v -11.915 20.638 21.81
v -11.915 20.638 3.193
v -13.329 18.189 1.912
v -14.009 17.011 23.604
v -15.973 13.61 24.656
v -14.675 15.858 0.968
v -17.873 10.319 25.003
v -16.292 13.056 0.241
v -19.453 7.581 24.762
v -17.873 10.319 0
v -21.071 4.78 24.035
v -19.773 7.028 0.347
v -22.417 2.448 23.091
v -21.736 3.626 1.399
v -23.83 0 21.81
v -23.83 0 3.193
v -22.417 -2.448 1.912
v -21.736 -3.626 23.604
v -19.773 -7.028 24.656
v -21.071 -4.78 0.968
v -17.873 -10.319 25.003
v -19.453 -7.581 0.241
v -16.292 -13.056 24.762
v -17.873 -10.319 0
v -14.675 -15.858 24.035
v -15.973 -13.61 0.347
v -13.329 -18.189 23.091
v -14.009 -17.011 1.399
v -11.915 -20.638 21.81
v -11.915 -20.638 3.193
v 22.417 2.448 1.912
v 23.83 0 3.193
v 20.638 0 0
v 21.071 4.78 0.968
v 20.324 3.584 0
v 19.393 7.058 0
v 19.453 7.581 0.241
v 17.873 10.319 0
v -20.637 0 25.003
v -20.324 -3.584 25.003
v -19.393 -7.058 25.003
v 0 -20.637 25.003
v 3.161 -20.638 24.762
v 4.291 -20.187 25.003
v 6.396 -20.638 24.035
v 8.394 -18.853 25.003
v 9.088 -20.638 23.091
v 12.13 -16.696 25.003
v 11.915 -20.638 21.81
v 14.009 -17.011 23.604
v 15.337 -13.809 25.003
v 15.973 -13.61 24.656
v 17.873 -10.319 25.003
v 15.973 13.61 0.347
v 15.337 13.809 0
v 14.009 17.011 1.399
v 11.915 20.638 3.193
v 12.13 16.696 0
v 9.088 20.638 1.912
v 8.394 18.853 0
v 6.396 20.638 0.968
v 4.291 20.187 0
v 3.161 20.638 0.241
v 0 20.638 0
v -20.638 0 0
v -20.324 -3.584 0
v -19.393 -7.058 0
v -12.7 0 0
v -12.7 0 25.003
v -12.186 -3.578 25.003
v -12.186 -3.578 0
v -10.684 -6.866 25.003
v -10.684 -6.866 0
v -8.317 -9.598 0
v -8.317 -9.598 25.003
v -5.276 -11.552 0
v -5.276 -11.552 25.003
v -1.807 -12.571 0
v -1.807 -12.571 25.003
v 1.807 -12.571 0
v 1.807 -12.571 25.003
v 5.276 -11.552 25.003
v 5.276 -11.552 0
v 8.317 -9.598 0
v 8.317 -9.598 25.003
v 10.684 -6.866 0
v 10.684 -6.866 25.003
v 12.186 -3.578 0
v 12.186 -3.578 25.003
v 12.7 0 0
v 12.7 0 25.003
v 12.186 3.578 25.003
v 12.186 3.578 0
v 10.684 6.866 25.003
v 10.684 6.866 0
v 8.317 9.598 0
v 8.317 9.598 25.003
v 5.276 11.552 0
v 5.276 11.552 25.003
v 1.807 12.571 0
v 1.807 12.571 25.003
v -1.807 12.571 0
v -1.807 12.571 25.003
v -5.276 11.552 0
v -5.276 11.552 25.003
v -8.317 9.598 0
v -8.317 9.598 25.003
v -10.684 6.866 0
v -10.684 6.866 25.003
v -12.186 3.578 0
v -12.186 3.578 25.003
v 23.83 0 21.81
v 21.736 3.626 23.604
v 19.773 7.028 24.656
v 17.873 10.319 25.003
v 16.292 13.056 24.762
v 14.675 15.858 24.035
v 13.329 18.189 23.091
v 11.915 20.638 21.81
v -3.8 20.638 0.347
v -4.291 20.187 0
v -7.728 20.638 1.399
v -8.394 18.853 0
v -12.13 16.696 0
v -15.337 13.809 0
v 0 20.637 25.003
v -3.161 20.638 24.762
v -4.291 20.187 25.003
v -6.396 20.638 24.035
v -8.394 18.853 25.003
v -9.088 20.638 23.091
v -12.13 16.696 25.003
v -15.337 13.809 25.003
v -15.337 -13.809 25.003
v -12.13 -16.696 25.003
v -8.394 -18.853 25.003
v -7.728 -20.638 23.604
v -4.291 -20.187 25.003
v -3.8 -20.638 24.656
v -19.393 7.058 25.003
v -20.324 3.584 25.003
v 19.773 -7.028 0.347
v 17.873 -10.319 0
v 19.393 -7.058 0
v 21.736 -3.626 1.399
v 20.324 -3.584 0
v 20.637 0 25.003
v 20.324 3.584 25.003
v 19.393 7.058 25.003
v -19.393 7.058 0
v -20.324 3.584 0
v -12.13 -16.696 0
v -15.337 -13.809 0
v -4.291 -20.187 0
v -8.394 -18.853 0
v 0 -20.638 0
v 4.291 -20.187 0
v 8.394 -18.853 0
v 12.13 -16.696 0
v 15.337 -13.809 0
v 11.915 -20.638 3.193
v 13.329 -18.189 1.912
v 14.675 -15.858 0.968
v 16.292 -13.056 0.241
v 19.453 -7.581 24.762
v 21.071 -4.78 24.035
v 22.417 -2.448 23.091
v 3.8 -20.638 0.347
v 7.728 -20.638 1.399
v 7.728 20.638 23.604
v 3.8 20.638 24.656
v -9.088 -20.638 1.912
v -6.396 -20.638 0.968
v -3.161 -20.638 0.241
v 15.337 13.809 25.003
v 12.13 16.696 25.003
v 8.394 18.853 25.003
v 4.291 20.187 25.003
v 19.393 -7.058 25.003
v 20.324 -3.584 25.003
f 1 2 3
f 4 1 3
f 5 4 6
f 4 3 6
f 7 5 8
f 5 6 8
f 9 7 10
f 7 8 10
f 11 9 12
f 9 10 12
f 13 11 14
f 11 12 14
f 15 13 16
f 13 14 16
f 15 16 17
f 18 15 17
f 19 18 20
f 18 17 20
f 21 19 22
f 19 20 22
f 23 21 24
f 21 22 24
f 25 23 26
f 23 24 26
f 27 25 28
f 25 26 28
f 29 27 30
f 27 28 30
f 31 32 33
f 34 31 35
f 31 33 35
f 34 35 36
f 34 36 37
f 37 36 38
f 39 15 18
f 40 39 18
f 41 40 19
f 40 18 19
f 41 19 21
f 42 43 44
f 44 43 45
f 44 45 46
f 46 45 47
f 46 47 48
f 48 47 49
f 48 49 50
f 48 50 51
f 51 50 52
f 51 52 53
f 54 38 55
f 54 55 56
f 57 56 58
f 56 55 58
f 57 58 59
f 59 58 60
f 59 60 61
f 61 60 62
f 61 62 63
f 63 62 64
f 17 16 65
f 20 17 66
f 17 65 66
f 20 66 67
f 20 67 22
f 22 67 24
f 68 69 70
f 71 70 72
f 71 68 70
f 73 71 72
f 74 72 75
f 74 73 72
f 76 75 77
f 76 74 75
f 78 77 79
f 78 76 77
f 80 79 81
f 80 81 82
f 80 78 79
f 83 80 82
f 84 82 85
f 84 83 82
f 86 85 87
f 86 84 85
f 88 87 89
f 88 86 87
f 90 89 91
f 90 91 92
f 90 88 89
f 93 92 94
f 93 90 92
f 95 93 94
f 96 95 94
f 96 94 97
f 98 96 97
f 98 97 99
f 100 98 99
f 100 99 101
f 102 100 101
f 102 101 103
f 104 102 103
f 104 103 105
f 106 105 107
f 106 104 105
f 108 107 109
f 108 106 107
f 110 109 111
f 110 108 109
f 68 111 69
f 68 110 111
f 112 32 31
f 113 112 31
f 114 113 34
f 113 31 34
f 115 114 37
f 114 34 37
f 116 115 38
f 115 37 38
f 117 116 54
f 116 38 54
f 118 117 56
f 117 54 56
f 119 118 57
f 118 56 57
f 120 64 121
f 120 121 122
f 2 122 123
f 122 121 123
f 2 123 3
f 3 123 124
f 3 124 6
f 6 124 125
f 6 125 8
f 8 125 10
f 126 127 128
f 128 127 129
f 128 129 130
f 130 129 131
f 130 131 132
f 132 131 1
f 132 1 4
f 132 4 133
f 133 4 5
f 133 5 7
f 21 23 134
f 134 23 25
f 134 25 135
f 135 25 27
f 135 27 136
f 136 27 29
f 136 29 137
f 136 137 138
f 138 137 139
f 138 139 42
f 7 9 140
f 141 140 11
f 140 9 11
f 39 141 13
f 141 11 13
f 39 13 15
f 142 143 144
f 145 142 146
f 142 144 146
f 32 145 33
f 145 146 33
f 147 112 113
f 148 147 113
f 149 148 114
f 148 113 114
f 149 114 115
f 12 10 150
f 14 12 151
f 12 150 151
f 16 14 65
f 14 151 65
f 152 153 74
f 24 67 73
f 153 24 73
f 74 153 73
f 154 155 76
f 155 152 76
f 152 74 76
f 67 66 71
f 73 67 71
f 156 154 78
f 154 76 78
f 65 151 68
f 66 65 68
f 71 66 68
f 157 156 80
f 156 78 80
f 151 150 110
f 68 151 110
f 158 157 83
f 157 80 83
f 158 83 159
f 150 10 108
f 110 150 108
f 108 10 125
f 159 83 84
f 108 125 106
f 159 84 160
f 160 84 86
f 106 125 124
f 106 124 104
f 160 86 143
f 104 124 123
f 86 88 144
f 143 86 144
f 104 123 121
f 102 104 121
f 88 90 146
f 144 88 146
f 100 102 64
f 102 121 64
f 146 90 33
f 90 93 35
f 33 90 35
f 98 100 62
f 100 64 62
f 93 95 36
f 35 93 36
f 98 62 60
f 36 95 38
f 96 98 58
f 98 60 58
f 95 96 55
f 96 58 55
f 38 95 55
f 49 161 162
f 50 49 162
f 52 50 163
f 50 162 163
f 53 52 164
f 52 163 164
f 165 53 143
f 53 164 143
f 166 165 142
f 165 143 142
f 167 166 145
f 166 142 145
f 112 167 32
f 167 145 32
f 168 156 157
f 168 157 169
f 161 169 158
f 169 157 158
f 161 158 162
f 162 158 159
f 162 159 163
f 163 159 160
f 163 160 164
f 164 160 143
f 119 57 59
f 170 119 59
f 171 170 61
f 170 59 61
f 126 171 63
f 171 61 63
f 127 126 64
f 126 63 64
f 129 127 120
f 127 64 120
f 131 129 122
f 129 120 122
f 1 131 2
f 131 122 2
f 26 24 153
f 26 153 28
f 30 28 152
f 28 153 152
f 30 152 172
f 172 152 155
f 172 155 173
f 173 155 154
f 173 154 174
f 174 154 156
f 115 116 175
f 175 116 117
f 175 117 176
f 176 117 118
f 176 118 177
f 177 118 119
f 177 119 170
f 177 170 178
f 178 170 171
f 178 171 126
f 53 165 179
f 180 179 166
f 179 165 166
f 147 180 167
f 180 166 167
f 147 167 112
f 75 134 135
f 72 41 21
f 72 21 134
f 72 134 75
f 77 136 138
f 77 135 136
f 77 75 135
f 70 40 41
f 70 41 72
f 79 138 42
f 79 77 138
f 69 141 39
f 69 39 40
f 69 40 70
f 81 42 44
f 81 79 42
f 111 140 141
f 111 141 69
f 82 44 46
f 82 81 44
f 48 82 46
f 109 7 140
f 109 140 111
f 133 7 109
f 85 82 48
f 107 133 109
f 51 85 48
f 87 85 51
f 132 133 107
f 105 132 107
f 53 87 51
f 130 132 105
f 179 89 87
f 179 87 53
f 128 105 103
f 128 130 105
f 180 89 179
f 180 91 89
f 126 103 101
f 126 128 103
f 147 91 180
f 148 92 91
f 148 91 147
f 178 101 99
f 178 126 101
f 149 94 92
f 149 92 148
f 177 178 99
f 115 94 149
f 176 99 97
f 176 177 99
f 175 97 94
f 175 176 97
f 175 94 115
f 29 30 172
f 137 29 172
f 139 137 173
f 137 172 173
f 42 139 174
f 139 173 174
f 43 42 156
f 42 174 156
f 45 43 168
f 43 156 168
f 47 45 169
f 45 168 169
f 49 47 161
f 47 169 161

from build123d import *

# Parameters (mm, degrees)
SKETCH1_R           = 12.7
BOSS_EXTRUDE1_DEPTH = 25.003125


with BuildPart() as part:
    # Sketch1 → Boss-Extrude1 (new body)
    with BuildSketch(Plane.XY):
        Polygon((-11.91506618, 20.6375), (-23.830132361, 0), (-11.91506618, -20.6375), (11.91506618, -20.6375), (23.830132361, 0), (11.91506618, 20.6375), align=None)
        with Locations(Location((0, 0, 0), (0, 0, 180))):
            Circle(SKETCH1_R, mode=Mode.SUBTRACT)
    extrude(amount=BOSS_EXTRUDE1_DEPTH)

    # Cut-Sweep1: sweep along a curve in space
    with BuildLine() as cut_sweep1_path:
        ThreePointArc((12.7, 0, 25.003125), (8.980256121, 8.980256121, 25.003125), (0, 12.7, 25.003125))
        ThreePointArc((0, 12.7, 25.003125), (-8.980256121, 8.980256121, 25.003125), (-12.7, 0, 25.003125))
        ThreePointArc((-12.7, 0, 25.003125), (-8.980256121, -8.980256121, 25.003125), (0, -12.7, 25.003125))
        ThreePointArc((0, -12.7, 25.003125), (8.980256121, -8.980256121, 25.003125), (12.7, 0, 25.003125))
    # Sketch2 → Cut-Sweep1 (sweep, cut)
    with BuildSketch(Plane(origin=(0, 0, 0), x_dir=(0, 0, -1), z_dir=(1, 0, 0))):
        Polygon((-25.003125, 20.6375), (-18.653125, 26.9875), (-31.353125, 26.9875), (-31.353125, 14.2875), align=None)
        Polygon((6.35, 14.2875), (0, 20.6375), (-6.35, 26.9875), (6.35, 26.9875), align=None)
    sweep(path=cut_sweep1_path.line, mode=Mode.SUBTRACT)


solid = part.part
